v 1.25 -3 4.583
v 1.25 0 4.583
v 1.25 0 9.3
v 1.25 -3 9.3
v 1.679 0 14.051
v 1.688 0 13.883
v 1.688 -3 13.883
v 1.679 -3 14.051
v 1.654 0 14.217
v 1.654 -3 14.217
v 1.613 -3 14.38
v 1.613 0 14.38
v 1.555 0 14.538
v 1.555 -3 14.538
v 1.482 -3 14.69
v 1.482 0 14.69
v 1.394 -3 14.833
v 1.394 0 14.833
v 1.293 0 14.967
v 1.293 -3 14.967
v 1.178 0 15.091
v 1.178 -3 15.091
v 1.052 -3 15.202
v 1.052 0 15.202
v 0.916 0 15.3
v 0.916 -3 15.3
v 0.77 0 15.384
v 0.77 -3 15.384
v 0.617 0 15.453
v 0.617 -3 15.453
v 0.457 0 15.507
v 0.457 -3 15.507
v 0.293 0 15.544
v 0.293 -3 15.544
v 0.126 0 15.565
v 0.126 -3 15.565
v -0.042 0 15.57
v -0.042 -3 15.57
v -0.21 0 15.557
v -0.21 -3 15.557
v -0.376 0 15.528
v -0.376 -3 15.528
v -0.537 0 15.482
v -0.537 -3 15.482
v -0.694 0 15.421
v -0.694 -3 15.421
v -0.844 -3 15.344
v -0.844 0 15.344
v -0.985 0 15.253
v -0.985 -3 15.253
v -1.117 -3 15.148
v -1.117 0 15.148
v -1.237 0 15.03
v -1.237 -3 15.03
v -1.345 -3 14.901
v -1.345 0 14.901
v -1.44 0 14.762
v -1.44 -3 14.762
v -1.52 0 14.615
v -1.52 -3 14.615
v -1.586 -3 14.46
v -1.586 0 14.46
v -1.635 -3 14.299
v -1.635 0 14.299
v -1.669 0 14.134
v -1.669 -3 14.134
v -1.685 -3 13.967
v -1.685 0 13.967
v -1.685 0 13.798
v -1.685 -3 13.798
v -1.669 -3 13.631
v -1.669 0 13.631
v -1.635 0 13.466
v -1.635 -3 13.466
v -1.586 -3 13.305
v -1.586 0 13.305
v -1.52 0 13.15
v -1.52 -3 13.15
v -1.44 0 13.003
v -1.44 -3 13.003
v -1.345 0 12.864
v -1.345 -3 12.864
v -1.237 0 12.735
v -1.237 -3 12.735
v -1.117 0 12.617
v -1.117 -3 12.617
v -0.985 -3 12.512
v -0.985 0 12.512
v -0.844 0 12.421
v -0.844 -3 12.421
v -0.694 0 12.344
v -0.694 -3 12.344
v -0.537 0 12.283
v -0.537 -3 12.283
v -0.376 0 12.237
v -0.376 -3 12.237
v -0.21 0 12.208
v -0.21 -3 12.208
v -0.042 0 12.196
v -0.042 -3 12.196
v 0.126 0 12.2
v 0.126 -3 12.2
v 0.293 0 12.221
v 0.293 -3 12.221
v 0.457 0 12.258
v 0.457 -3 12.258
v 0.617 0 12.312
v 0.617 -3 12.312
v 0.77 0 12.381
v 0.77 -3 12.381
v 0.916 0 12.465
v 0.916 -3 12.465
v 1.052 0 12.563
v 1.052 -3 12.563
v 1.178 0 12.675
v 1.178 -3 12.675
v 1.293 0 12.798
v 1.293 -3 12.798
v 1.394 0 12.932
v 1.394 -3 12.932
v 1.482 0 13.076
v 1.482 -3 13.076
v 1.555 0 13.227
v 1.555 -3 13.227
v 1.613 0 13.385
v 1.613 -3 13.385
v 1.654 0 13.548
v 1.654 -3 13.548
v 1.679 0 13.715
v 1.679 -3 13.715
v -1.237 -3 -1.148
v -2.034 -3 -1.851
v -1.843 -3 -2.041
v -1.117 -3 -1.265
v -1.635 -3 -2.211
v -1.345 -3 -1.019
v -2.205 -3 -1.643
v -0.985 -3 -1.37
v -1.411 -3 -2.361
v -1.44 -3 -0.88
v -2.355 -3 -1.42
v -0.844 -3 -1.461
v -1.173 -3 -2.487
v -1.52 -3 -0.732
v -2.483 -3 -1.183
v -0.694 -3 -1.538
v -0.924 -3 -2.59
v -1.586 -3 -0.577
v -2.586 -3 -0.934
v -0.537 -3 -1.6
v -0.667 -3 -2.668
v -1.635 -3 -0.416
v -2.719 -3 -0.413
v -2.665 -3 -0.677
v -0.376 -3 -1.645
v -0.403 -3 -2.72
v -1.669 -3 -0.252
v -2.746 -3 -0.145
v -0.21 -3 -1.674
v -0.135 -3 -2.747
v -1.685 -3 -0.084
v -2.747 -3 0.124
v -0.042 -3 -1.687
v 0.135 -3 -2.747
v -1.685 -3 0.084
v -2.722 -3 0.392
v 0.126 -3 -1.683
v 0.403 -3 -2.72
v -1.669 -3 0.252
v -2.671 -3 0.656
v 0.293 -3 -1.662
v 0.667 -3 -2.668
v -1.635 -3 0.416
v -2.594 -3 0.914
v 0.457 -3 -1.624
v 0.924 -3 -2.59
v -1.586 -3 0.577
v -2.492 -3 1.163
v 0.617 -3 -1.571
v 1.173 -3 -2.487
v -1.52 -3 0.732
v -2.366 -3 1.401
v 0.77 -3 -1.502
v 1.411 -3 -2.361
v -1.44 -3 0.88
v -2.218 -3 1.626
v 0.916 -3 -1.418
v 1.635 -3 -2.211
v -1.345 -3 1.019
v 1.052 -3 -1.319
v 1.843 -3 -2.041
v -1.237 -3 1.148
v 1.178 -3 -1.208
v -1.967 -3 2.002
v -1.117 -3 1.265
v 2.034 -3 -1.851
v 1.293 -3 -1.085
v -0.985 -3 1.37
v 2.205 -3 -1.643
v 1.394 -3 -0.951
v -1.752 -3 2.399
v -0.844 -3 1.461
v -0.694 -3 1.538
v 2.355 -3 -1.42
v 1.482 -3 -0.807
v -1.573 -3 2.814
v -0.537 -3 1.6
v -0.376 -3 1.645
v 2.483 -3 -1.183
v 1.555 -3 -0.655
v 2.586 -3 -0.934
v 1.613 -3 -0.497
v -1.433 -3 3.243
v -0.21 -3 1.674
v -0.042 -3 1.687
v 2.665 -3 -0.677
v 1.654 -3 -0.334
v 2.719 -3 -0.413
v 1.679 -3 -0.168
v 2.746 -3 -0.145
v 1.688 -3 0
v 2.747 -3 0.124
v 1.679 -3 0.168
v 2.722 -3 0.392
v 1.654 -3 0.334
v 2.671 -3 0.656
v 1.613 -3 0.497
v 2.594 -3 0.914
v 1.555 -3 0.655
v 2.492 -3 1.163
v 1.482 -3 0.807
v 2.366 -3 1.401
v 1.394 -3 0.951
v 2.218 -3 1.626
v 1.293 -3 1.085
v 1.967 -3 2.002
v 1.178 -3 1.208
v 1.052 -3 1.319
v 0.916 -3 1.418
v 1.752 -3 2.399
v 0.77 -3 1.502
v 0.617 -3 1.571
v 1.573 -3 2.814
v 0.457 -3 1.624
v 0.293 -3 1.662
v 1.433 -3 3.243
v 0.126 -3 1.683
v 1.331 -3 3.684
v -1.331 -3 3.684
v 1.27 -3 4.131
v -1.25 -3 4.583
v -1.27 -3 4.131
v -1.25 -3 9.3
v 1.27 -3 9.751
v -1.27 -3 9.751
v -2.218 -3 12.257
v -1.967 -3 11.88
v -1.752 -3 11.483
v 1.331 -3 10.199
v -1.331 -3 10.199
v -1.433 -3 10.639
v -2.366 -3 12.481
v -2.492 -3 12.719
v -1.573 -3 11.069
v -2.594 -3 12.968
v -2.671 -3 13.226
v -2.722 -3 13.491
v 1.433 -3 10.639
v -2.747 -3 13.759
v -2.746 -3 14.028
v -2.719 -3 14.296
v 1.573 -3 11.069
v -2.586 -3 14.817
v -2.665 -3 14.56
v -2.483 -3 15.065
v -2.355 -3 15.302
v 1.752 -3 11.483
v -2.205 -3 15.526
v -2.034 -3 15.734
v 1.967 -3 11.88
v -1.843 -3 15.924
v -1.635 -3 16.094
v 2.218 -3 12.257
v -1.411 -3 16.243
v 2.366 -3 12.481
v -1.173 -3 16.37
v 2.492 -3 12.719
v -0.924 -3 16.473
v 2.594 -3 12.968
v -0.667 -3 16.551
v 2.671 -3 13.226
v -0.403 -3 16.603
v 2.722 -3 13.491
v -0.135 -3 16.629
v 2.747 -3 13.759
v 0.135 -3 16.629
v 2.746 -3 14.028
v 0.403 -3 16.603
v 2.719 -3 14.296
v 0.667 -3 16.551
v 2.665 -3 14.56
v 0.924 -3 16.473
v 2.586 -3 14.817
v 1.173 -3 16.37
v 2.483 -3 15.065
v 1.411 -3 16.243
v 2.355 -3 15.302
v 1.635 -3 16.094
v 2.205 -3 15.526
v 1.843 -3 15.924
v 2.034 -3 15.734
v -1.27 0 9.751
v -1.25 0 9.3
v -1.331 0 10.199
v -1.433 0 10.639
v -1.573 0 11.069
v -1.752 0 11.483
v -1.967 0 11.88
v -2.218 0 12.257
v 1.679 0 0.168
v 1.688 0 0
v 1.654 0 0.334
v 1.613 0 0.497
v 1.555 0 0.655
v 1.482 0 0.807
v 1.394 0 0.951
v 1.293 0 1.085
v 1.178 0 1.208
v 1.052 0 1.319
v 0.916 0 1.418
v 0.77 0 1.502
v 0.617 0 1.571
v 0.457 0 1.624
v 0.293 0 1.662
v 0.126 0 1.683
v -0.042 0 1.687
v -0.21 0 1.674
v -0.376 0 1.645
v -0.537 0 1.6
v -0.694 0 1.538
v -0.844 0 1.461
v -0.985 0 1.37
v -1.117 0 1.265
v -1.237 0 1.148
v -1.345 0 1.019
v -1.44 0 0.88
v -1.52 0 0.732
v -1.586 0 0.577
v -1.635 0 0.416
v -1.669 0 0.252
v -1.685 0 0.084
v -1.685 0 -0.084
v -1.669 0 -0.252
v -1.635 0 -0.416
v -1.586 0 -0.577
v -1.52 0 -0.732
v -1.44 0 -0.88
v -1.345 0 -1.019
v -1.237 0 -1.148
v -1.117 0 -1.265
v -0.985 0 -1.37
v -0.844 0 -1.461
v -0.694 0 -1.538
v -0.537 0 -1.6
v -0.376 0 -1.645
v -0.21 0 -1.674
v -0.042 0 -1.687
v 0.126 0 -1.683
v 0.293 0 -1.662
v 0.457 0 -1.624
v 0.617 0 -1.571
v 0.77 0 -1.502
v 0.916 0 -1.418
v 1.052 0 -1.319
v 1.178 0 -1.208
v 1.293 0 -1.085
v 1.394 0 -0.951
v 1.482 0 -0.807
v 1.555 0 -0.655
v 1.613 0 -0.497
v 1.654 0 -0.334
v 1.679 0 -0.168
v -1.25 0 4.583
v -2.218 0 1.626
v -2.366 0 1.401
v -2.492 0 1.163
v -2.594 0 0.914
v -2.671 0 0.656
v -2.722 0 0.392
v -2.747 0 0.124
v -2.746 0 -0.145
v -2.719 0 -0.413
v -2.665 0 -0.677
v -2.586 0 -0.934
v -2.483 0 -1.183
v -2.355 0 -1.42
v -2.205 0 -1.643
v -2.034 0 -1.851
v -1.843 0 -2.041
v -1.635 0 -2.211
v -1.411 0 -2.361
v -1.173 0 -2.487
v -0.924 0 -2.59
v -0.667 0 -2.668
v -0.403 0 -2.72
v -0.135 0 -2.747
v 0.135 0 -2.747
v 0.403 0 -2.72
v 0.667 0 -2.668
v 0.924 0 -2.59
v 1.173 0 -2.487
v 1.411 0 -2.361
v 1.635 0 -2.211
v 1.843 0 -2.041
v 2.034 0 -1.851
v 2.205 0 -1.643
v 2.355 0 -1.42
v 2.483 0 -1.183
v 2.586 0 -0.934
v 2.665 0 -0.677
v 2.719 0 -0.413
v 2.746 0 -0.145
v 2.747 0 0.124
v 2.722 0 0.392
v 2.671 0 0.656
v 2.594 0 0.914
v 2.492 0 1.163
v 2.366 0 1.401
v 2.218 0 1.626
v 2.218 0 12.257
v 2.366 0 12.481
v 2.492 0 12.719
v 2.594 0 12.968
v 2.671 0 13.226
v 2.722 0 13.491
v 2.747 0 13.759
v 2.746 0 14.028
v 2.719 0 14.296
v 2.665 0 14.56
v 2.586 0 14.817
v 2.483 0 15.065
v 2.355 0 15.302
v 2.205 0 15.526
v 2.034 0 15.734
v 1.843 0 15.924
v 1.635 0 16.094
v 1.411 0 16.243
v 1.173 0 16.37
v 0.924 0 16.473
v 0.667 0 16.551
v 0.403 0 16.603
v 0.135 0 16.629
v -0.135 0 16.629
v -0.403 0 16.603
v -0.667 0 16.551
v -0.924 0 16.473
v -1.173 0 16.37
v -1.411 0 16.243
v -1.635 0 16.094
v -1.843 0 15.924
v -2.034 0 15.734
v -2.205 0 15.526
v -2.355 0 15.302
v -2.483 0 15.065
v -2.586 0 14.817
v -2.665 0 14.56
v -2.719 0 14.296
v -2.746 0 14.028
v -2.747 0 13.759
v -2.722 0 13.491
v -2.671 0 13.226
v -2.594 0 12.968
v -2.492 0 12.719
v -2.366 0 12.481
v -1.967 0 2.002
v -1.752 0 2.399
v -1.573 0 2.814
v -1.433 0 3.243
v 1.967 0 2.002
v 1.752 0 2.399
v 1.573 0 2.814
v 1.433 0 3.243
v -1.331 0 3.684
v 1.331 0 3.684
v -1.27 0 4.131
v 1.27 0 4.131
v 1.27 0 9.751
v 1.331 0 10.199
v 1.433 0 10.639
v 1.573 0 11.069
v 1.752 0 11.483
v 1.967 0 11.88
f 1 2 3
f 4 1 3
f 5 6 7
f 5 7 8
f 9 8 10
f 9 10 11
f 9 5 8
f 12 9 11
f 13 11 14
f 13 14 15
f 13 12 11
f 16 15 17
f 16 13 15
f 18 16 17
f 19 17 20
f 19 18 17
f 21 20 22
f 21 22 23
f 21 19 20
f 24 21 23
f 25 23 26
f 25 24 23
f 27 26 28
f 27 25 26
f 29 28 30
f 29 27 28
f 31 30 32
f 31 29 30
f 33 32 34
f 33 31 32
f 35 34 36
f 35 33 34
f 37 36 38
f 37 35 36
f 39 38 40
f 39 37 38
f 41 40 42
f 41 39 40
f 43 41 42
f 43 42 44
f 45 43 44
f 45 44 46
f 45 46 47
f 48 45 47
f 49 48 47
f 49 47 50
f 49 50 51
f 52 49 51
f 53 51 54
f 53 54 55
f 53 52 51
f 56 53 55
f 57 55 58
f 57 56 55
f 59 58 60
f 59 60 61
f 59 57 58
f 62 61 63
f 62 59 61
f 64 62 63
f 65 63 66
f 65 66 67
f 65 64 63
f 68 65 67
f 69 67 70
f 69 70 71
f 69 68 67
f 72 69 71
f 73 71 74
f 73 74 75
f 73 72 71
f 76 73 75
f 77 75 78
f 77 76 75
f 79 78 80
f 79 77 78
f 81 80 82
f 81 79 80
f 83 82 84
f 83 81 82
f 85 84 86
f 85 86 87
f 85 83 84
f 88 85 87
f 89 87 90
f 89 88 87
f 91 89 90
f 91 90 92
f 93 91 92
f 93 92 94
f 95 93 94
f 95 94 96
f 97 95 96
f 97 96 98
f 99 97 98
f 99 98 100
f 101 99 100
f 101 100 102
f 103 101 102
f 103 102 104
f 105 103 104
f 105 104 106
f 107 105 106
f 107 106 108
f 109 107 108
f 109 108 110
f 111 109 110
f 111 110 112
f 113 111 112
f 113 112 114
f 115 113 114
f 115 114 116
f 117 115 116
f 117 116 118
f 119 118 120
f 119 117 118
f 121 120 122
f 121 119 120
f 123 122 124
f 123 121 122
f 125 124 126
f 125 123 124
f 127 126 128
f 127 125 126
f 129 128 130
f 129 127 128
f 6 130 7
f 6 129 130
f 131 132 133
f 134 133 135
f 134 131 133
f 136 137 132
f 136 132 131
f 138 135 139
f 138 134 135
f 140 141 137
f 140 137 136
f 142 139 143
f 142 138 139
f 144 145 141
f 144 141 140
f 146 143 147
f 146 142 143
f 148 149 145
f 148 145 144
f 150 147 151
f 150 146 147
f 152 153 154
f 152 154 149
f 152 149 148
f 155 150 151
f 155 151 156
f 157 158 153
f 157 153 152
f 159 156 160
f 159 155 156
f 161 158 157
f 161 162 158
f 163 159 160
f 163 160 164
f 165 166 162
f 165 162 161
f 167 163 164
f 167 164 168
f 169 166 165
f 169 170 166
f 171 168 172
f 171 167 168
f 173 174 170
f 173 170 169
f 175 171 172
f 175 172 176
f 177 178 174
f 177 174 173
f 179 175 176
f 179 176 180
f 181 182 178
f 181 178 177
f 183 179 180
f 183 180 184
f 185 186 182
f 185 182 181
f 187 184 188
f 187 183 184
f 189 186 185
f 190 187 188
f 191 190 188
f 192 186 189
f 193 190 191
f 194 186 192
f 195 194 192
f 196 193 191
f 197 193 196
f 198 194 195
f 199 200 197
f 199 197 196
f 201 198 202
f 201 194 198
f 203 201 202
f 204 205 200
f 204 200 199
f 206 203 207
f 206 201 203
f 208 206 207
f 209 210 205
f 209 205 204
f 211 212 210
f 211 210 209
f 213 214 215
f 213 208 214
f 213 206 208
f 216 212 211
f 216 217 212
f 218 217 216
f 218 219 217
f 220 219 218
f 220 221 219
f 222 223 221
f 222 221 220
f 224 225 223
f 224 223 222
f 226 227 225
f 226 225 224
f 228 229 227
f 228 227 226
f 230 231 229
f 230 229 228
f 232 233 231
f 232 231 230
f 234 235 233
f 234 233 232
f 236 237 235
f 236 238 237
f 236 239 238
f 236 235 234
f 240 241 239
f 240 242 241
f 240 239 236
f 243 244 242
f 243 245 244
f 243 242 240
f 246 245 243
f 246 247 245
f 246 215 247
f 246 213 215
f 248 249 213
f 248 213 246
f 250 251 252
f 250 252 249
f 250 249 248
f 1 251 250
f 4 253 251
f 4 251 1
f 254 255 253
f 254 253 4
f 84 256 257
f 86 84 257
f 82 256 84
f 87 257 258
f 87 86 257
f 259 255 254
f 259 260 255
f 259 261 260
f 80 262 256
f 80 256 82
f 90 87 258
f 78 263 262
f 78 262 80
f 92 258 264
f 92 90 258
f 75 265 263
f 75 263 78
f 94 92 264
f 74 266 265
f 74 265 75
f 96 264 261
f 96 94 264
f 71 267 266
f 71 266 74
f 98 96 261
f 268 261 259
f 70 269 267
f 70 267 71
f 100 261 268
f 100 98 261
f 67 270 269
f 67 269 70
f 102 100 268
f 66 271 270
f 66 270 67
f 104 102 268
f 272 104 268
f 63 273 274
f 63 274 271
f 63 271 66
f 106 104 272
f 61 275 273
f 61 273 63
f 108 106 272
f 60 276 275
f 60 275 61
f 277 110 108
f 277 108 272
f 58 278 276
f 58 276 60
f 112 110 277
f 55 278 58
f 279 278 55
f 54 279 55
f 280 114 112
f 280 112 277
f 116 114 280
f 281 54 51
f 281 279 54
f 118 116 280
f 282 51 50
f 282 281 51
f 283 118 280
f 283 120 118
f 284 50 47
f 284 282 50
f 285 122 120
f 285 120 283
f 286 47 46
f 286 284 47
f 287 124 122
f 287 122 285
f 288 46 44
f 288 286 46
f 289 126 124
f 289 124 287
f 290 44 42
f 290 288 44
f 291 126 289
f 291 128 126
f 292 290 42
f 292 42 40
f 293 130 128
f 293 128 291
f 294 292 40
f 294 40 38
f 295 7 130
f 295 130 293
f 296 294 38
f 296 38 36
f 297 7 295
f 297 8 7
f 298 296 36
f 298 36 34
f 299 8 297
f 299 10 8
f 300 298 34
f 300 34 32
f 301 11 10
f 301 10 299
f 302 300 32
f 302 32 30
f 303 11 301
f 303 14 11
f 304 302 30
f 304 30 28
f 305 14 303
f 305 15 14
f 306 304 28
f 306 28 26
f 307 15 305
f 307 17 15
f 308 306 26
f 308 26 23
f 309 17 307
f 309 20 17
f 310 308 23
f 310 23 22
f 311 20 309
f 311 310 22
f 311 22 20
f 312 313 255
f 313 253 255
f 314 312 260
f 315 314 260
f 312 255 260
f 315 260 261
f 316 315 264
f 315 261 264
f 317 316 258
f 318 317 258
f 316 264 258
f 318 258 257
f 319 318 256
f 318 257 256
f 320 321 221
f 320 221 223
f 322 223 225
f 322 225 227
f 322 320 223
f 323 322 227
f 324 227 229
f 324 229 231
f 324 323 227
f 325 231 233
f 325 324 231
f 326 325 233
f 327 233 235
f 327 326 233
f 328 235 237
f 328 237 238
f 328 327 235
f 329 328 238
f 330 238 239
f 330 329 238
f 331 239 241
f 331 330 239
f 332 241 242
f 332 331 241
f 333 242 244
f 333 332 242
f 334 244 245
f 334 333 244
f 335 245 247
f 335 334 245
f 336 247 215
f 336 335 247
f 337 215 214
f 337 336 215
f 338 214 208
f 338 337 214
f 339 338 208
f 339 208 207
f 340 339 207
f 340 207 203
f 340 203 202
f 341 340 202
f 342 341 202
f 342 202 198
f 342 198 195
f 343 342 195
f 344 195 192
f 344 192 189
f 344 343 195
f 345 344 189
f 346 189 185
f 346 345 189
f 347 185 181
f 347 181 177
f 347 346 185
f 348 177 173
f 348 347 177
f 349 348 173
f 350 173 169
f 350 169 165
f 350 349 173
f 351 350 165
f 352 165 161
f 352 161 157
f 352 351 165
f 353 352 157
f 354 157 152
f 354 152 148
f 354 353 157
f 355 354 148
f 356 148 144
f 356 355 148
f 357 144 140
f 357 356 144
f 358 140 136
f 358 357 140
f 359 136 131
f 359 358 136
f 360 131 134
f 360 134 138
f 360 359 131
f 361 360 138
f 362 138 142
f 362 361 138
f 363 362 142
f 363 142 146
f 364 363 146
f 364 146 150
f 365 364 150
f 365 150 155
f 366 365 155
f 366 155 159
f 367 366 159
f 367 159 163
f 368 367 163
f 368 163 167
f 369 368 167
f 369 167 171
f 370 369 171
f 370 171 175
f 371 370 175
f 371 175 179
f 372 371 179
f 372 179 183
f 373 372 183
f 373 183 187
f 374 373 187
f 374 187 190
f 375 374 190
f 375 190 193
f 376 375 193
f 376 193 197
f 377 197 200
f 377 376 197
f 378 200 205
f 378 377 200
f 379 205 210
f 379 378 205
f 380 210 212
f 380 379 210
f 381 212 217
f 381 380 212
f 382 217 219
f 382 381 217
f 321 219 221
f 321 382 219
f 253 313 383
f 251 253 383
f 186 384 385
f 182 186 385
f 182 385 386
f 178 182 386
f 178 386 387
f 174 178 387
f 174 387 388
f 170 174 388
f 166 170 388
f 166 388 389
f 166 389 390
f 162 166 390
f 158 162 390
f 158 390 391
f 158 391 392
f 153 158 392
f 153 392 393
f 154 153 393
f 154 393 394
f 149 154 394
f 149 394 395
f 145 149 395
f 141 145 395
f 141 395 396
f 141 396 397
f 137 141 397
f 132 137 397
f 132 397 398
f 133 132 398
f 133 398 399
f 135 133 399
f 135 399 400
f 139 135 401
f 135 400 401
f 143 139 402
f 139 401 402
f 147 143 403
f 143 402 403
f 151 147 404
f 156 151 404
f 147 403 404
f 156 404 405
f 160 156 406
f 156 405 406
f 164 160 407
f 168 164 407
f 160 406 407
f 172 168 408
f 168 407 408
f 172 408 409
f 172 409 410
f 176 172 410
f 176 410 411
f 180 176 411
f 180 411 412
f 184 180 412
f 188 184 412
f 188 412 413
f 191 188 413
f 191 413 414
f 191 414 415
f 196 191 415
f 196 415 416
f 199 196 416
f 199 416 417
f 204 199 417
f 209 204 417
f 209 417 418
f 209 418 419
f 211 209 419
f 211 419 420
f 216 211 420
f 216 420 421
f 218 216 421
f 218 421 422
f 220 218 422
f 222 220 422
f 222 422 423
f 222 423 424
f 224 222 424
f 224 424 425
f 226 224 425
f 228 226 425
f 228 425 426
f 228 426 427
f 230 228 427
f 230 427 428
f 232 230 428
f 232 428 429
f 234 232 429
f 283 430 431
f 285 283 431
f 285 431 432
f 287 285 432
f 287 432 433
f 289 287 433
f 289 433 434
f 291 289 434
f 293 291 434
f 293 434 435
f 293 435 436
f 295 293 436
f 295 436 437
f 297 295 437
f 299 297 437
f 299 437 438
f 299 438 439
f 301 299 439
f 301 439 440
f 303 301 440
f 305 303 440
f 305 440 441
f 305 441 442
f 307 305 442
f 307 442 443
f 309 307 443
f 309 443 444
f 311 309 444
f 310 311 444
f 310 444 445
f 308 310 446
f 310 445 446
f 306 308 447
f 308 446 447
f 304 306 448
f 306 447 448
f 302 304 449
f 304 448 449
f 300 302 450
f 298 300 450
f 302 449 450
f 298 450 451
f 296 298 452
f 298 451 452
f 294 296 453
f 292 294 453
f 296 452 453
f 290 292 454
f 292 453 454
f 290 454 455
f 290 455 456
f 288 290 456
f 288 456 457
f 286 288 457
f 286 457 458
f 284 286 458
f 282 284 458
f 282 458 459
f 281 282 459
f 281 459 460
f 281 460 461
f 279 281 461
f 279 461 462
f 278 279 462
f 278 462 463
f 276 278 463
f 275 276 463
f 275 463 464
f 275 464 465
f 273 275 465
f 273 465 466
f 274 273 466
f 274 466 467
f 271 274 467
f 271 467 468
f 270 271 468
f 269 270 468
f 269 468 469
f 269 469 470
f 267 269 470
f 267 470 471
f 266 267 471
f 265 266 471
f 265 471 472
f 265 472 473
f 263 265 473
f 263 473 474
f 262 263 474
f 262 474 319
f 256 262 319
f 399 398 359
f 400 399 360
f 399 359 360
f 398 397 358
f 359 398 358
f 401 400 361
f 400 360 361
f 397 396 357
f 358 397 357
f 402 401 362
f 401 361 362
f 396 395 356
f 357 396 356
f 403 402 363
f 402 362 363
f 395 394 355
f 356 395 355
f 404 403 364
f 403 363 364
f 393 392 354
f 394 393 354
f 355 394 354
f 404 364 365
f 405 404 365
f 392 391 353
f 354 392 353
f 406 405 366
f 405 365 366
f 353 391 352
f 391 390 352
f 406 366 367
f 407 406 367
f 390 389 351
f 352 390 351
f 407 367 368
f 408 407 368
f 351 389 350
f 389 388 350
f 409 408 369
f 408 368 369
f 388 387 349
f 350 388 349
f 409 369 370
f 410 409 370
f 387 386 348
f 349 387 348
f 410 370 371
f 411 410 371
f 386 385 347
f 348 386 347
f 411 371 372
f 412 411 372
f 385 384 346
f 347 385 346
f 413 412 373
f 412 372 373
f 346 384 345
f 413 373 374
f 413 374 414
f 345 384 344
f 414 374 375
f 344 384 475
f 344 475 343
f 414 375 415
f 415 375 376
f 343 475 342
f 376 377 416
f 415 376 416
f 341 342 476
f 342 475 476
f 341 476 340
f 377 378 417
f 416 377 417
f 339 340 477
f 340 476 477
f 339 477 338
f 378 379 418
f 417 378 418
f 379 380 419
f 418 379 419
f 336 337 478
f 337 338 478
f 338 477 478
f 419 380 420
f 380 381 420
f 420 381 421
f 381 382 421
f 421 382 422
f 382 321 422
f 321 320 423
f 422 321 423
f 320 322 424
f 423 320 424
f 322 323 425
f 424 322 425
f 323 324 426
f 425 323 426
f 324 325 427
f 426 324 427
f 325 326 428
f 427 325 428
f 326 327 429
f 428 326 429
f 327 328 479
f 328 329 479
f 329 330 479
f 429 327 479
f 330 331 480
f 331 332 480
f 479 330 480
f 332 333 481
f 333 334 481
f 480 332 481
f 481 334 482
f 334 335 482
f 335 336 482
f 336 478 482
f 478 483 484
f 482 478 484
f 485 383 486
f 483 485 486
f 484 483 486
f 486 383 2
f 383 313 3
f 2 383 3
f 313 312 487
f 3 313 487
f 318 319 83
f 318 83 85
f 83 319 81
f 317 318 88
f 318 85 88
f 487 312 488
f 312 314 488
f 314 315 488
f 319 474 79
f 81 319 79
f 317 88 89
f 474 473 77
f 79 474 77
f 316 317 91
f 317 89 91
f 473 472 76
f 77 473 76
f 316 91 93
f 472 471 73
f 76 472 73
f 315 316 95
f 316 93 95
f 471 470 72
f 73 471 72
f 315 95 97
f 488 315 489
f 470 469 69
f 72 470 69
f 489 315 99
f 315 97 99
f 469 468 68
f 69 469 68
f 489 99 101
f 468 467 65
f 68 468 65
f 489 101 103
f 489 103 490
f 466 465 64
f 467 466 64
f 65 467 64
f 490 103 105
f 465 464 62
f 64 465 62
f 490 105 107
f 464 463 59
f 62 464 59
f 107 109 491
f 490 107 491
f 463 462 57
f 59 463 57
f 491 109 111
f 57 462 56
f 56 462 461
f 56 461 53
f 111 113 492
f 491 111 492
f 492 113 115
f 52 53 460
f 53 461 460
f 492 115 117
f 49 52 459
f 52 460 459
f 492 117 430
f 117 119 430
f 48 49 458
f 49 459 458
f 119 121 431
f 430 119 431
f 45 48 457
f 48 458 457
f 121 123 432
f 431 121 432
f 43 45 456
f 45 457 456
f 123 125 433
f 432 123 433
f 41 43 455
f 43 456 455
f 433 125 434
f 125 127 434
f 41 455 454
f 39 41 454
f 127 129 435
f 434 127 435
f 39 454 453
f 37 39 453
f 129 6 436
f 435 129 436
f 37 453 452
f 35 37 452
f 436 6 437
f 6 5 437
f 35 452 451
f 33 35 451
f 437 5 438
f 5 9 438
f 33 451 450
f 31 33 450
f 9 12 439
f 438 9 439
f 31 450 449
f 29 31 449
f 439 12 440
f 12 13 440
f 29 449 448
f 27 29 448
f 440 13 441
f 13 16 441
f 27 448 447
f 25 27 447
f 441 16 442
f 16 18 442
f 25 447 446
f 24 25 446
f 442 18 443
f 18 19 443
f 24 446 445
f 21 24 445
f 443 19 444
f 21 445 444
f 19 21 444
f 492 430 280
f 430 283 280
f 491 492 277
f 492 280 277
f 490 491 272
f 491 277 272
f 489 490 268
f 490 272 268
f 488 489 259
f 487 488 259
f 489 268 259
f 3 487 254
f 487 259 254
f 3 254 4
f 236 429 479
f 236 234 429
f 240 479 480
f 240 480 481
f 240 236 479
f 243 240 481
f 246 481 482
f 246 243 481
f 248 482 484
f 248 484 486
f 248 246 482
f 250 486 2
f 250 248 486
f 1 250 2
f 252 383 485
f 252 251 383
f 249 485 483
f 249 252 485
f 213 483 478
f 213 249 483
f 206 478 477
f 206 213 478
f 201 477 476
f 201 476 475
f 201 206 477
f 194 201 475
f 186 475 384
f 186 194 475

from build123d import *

# Parameters (mm, degrees)
F0_R     = 1.6875
F1_DEPTH = 3
F2_R     = 5


with BuildPart() as f1:
    # F0 (on Front) → F1 (new body)
    with BuildSketch(Plane.XZ):
        with BuildLine():
            Line((-1.25, 11.433086), (-1.25, 2.44949))
            ThreePointArc((-1.25, 2.44949), (0, -2.75), (1.25, 2.44949))
            Line((1.25, 2.44949), (1.25, 11.433086))
            ThreePointArc((1.25, 11.433086), (0, 16.632576), (-1.25, 11.433086))
        make_face()
        Circle(F0_R, mode=Mode.SUBTRACT)
        with Locations((0, 13.882576)):
            Circle(F0_R, mode=Mode.SUBTRACT)
    extrude(amount=F1_DEPTH)

    # F2
    f2_edges = [f1.edges().sort_by_distance(p)[0] for p in [
        (1.25, -1.5, 2.44949),
        (-1.25, -1.5, 2.44949),
        (-1.25, -1.5, 11.433086),
        (1.25, -1.5, 11.433086),
    ]]
    fillet(f2_edges, radius=F2_R)


solid = f1.part
